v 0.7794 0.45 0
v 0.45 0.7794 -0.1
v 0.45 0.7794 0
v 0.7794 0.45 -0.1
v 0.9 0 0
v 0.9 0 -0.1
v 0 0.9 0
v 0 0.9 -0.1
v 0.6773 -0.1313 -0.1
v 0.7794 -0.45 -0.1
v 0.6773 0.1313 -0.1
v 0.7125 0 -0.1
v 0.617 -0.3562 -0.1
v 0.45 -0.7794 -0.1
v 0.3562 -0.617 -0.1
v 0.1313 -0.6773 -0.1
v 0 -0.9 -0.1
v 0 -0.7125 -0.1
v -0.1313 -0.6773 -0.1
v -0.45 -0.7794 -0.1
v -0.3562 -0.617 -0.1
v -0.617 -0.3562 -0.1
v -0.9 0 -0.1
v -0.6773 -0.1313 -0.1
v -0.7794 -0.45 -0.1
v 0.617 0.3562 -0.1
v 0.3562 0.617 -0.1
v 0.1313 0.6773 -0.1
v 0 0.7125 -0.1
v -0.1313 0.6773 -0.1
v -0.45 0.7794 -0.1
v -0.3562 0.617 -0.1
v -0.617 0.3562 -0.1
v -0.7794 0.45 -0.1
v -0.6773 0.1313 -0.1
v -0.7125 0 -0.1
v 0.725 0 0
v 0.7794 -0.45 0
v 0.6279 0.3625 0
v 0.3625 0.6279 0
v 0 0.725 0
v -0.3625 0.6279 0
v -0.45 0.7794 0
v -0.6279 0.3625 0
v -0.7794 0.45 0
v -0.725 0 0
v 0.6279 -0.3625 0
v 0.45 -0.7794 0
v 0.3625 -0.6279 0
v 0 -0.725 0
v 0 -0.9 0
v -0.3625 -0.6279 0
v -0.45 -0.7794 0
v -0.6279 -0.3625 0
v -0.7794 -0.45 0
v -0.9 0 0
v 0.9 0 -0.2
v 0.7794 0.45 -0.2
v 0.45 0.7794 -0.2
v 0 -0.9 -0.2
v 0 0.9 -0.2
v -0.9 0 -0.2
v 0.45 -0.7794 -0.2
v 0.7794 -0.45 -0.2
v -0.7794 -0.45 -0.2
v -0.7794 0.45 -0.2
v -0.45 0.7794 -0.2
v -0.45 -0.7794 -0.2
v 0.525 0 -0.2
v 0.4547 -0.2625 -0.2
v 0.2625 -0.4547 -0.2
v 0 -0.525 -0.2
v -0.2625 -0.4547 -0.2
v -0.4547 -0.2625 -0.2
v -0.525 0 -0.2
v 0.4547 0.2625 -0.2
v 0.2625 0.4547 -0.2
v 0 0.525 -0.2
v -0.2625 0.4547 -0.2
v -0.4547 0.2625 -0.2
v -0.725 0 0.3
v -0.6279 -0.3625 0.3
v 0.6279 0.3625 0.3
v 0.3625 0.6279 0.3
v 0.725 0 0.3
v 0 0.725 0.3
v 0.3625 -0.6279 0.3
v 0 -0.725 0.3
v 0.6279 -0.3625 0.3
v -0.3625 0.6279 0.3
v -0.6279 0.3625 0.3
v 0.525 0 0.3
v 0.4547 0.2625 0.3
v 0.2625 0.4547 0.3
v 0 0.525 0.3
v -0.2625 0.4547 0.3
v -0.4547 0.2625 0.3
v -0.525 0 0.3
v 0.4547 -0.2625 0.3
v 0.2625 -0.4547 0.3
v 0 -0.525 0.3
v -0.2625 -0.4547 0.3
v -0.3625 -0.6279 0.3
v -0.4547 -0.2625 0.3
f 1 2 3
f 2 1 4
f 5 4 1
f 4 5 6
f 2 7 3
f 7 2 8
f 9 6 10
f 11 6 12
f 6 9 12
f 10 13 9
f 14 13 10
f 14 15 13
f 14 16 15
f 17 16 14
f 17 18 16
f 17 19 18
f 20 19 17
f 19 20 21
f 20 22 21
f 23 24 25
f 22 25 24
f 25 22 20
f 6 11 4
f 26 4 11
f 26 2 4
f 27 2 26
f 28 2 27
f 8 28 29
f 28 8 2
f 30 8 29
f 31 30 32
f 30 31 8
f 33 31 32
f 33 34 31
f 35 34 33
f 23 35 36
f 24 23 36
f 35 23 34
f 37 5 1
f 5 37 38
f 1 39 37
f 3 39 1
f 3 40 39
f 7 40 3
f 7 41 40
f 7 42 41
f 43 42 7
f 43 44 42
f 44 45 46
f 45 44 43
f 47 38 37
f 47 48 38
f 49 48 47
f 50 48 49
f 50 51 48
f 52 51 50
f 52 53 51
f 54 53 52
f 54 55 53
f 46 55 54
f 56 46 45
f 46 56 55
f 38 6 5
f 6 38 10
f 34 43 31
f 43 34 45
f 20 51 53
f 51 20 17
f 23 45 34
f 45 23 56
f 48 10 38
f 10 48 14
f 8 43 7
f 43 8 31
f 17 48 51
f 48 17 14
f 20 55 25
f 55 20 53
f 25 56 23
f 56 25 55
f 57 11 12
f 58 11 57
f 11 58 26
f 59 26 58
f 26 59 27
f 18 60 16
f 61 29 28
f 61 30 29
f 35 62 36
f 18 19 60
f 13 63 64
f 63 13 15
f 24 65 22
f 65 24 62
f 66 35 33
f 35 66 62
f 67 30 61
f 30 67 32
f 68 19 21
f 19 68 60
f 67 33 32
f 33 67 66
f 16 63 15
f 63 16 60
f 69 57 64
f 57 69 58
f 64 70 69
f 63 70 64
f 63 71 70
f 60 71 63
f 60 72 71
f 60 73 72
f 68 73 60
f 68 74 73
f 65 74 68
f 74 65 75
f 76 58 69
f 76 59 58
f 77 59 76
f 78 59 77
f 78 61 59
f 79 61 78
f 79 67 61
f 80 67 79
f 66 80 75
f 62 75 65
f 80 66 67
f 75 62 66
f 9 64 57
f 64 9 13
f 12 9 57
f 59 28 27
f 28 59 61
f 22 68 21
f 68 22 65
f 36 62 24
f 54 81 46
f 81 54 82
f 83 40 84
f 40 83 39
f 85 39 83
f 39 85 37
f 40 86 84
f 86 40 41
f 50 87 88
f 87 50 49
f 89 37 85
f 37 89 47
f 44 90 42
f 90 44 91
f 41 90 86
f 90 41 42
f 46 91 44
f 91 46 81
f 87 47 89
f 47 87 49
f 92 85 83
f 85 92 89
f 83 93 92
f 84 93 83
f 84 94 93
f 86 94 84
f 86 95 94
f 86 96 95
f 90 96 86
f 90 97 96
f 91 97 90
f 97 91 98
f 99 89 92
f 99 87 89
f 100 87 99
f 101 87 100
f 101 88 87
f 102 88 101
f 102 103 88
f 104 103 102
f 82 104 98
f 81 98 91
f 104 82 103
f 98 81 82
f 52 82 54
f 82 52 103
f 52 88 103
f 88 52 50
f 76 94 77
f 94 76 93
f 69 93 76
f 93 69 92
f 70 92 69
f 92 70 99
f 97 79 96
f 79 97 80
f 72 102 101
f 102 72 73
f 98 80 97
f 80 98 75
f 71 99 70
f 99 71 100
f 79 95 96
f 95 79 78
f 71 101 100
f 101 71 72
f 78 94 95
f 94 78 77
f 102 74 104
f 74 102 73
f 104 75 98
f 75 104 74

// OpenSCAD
tolerance=0.075;
hole_radius=0.075;
grid_hole_radius=0.075;
outer_radius=1;
thickness=0.2;
hole_attach_height=0.075;
attach_thickness=0.1;

//parameters that don't have to be defined explicitly
eps = tolerance/100;
inner_radius = outer_radius - thickness;
fn = 12;
fnh = 6;

module angled_cylinder(angle_deg_y, _h, _r, angle_deg_x = 0) {
    rotate([angle_deg_x, angle_deg_y, 0]) { // Rotate the cylinder 
            cylinder(h = _h, r = _r, center = true, $fn = fnh);
        }
}

module hole(_h) {
    cylinder(h = _h, r = grid_hole_radius, $fn = fnh);
}

//makes circle of holes
module circular_grid(_h, _r, _n) {
    for (i = [0:_n-1]) {
        angle = i * 360 / _n;
        x_pos = _r * cos(angle);
        y_pos = _r * sin(angle);
        translate([x_pos, y_pos, -eps]) {
            hole(_h);
        }
    }
}

//makes grid of holes
module hole_grid(hole_height, grid_h) {
    translate([0,0,hole_height]) {
        difference() {
            //cylinder
            cylinder(h = grid_h, r = (inner_radius + outer_radius)/2, 
                center=false, $fn = fn);
            //holes
            for (i = [0 : grid_hole_radius * 2 + hole_attach_height : inner_radius - grid_hole_radius * 2]) {
                circular_grid(grid_h + eps*2, i, ceil(6.28*i/(grid_hole_radius*4)));
            }
            
        } 
    }
}

//makes curve of CSC
module curve(_radius, _twist, _turning_angle, _turning_radius) {
    rotate([90,0,_twist])
    translate([-_turning_radius, 0, 0])
    rotate_extrude(angle=_turning_angle, convexity=100, $fn = fn)
    translate([_turning_radius, 0]) circle(_radius);
}

module CSC(_r, _t1, _ta1, _tr1, _h, _t2, _ta2, _tr2, is_inner) {
    
    if (_ta1 > 90) {
        CSC(_r, _t1, 90, _tr1, 0, 0, 0, 0, is_inner);
        
        pos1 = (-_tr1 + sqrt(_tr1*_tr1 - pow(_tr1,2)));
        translate([pos1*cos(_t1),pos1*sin(_t1),_tr1])
        rotate([0,-90,_t1])
        CSC(_r, 0, _ta1 - 90, _tr1, _h, _t2, _ta2, _tr2, is_inner);
    } else if (_ta2 > 90) {
        CSC(_r, _t1, _ta1, _tr1, _h, _t2, 90, _tr2, is_inner);
        
        pos1 = (-_tr1 + sqrt(_tr1*_tr1 - pow(_tr1*sin(_ta1),2)));
        pos2 = (-_tr2 + sqrt(_tr2*_tr2 - pow(_tr2,2)));
        translate([pos1*cos(_t1),pos1*sin(_t1),_tr1*sin(_ta1)])
        rotate([0,-_ta1,_t1])
        translate([0, 0, _h])
        translate([pos2*cos(_t2),pos2*sin(_t2),_tr2])
        rotate([0,-90,_t2])
        CSC(_r, 0, 0, 0, 0, 0, _ta2 - 90, _tr2, is_inner);
    } else {
        //intermediate positions
        pos1 = (-_tr1 + sqrt(_tr1*_tr1 - pow(_tr1*sin(_ta1),2)));
        pos2 = (-_tr2 + sqrt(_tr2*_tr2 - pow(_tr2*sin(_ta2),2)));
        
        union() {
            //bottom shell threshold
            if (is_inner) {
                cylinder(h=eps, r=_r, center=true);
            }
            
            //first curve of CSC
            curve(_r, _t1, _ta1, _tr1);
            
            //straight link of CSC
            translate([pos1*cos(_t1),pos1*sin(_t1),_tr1*sin(_ta1)])
            rotate([0,-_ta1,_t1])
            if (is_inner) {
                //add threshold for shelling
                translate([0,0,-eps /2])
                cylinder(h=_h + eps,r=_r, center = false, $fn= fn);
            } else {
                cylinder(h=_h,r=_r, center = false, $fn= fn);
            }
            
            //second curve of CSC
            translate([pos1*cos(_t1),pos1*sin(_t1),_tr1*sin(_ta1)])
            rotate([0,-_ta1,_t1])
            translate([0, 0, _h])
            curve(_r, _t2, _ta2, _tr2);
            
            //shelling thresholds
            if (is_inner) {
                translate([pos1*cos(_t1),pos1*sin(_t1),_tr1*sin(_ta1)])
                rotate([0,-_ta1,_t1])
                translate([0, 0, _h])
                translate([pos2*cos(_t2),pos2*sin(_t2),_tr2*sin(_ta2)])
                rotate([0,-_ta2,_t2]) {
                    cylinder(h=eps, r=_r, center=true,$fn=fn);
                }
            
            }
        }
    }
    
}

//allow modules to attach
module CSC_ATTACH(_r, _t1, _ta1, _tr1, _h, _t2, _ta2, _tr2, next_hole_radius, next_hole_attach_height, next_inner) {
    
    if (_ta1 > 90) {        
        pos1 = (-_tr1 + sqrt(_tr1*_tr1 - pow(_tr1,2)));
        translate([pos1*cos(_t1),pos1*sin(_t1),_tr1])
        rotate([0,-90,_t1])
        CSC_ATTACH(_r, 0, _ta1 - 90, _tr1, _h, _t2, _ta2, _tr2, next_hole_radius, next_hole_attach_height, next_inner);
    } else if (_ta2 > 90) {        
        pos1 = (-_tr1 + sqrt(_tr1*_tr1 - pow(_tr1*sin(_ta1),2)));
        pos2 = (-_tr2 + sqrt(_tr2*_tr2 - pow(_tr2,2)));
        translate([pos1*cos(_t1),pos1*sin(_t1),_tr1*sin(_ta1)])
        rotate([0,-_ta1,_t1])
        translate([0, 0, _h])
        translate([pos2*cos(_t2),pos2*sin(_t2),_tr2])
        rotate([0,-90,_t2])
        CSC_ATTACH(_r, 0, 0, 0, 0, 0, _ta2 - 90, _tr2, next_hole_radius, next_hole_attach_height, next_inner);
    } else {
        //intermediate positions
        pos1 = (-_tr1 + sqrt(_tr1*_tr1 - pow(_tr1*sin(_ta1),2)));
        pos2 = (-_tr2 + sqrt(_tr2*_tr2 - pow(_tr2*sin(_ta2),2)));
        
        translate([pos1*cos(_t1),pos1*sin(_t1),_tr1*sin(_ta1)])
        rotate([0,-_ta1,_t1])
        translate([0, 0, _h])
        translate([pos2*cos(_t2),pos2*sin(_t2),_tr2*sin(_ta2)])
        rotate([0,-_ta2,_t2]) {
            difference() {
                union() {
                    //attachment for smaller cylinder
                    translate([0,0,-attach_thickness])
                    cylinder(h=attach_thickness, r=_r - thickness/2, $fn=fn);
                    translate([0,0,-attach_thickness*2])
                    cylinder(h=attach_thickness*2, r1=_r - thickness/2, r2=next_inner - tolerance - thickness, $fn=fn);
                    
                    //small cylinder
                    cylinder(h=next_hole_radius*2 + next_hole_attach_height * 2, r = next_inner - tolerance, $fn=fn);
                }
                
                //shelling
                translate([0,0, -attach_thickness*2 - eps/2])
                cylinder(h=next_hole_radius*2 + next_hole_attach_height * 2 + attach_thickness*2 + eps, r = min(inner_radius, next_inner - tolerance - thickness), $fn=fn);
                
                //holes for screws
    //            translate([0,0,next_hole_attach_height + next_hole_radius]) {
    //                angled_cylinder(0, (next_inner + thickness + eps) * 2,  hole_radius, 90);
    //                angled_cylinder(90, (next_inner + thickness + eps) * 2, hole_radius, 0);
    //            }
            }
        }
    }
}

//remove overlap to allow all branches to attach to each other
module CSC_REMOVE_OVERLAP(_r, _t1, _ta1, _tr1, _h, _t2, _ta2, _tr2, next_hole_radius, next_hole_attach_height, next_inner) {
    if (_ta1 > 90) {        
        pos1 = (-_tr1 + sqrt(_tr1*_tr1 - pow(_tr1,2)));
        translate([pos1*cos(_t1),pos1*sin(_t1),_tr1])
        rotate([0,-90,_t1])
        CSC_REMOVE_OVERLAP(_r, 0, _ta1 - 90, _tr1, _h, _t2, _ta2, _tr2, next_hole_radius, next_hole_attach_height, next_inner);
    } else if (_ta2 > 90) {        
        pos1 = (-_tr1 + sqrt(_tr1*_tr1 - pow(_tr1*sin(_ta1),2)));
        pos2 = (-_tr2 + sqrt(_tr2*_tr2 - pow(_tr2,2)));
        translate([pos1*cos(_t1),pos1*sin(_t1),_tr1*sin(_ta1)])
        rotate([0,-_ta1,_t1])
        translate([0, 0, _h])
        translate([pos2*cos(_t2),pos2*sin(_t2),_tr2])
        rotate([0,-90,_t2])
        CSC_REMOVE_OVERLAP(_r, 0, 0, 0, 0, 0, _ta2 - 90, _tr2, next_hole_radius, next_hole_attach_height, next_inner);
    } else {
        pos1 = (-_tr1 + sqrt(_tr1*_tr1 - pow(_tr1*sin(_ta1),2)));
        pos2 = (-_tr2 + sqrt(_tr2*_tr2 - pow(_tr2*sin(_ta2),2)));
        
        translate([pos1*cos(_t1),pos1*sin(_t1),_tr1*sin(_ta1)])
        rotate([0,-_ta1,_t1])
        translate([0, 0, _h])
        translate([pos2*cos(_t2),pos2*sin(_t2),_tr2*sin(_ta2)])
        rotate([0,-_ta2,_t2]) {
            cylinder(h=999999, r=_r + tolerance, $fn=fn);
        }
    }
}

//c is _t1, _ta1, _tr1, _h, _t2, _ta2, _tr2, next hole radius, next hole height, next inner radius
module branch(branch_list, _outer, _inner) {
    union() {
        //make grid of holes
        //hole_grid(hole_radius*2 + hole_attach_height * 2, grid_hole_radius);
        
        //make CSC shells for each CSC in branch_list
        difference() {
            for (c = branch_list) {
                CSC(_outer,c[0],c[1],c[2],c[3],c[4],c[5],c[6], false);
            }
            
            for (c = branch_list) {
                CSC(_inner,c[0],c[1],c[2],c[3],c[4],c[5],c[6], true);
                CSC_REMOVE_OVERLAP(_outer,c[0],c[1],c[2],c[3],c[4],c[5],c[6],c[7], c[8], c[9]);
            }
            
            //make screw holes at the bottom
//            translate([0,0,hole_radius + hole_attach_height]) {
//                angled_cylinder(0, (outer_radius*1.5 + eps) * 2,  hole_radius, 90);
//                angled_cylinder(90, (outer_radius*1.5 + eps) * 2, hole_radius, 0);
//            }    
        }
        for (c=branch_list) {     
            CSC_ATTACH(_outer,c[0],c[1],c[2],c[3],c[4],c[5],c[6], c[7], c[8], c[9]);
        }
    }
}

branch([
[ 0.0, 0.0, 1.0*outer_radius, 0.0*outer_radius, 0.0, 0.0, 1.0*outer_radius, 0.075, 0.075, 0.8],
],outer_radius,inner_radius);
